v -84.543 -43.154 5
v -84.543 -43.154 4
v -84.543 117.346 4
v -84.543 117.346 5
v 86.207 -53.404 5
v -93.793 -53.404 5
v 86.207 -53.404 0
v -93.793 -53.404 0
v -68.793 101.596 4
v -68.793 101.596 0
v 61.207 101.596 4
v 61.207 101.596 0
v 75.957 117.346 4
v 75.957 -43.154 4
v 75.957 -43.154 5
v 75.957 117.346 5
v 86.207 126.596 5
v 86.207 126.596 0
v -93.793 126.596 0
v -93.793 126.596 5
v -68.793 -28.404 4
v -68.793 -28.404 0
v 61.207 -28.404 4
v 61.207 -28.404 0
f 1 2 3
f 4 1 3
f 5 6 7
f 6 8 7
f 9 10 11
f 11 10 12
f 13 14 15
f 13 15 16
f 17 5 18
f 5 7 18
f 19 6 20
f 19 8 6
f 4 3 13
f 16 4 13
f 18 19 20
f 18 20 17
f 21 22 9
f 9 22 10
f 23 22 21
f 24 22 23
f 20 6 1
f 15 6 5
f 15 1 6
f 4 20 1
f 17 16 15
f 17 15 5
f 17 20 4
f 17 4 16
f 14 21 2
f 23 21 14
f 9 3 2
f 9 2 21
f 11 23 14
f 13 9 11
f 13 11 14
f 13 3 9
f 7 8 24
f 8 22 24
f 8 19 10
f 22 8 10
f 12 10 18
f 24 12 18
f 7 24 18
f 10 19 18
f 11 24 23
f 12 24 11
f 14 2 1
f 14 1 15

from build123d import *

# Parameters (mm, degrees)
F0_W     = 180
F0_H     = 180
F0_W_2   = 130
F0_H_2   = 130
F1_DEPTH = 4
F2_W     = 180
F2_H     = 180
F2_W_2   = 160.5
F2_H_2   = 160.5
F3_DEPTH = 1


with BuildPart() as f1:
    # F0 (on Top) → F1 (new body)
    with BuildSketch(Plane.XY):
        with Locations((-3.792722, 36.59609)):
            Rectangle(F0_W, F0_H)
        with Locations((-3.792722, 36.59609)):
            Rectangle(F0_W_2, F0_H_2, mode=Mode.SUBTRACT)
    extrude(amount=F1_DEPTH)

    # F2 (on face) → F3 (join)
    with BuildSketch(Plane.XY.offset(4)):
        with Locations((-3.792722, 36.59609)):
            Rectangle(F2_W, F2_H)
        with Locations((-4.292722, 37.09609)):
            Rectangle(F2_W_2, F2_H_2, mode=Mode.SUBTRACT)
    extrude(amount=F3_DEPTH)


solid = f1.part
